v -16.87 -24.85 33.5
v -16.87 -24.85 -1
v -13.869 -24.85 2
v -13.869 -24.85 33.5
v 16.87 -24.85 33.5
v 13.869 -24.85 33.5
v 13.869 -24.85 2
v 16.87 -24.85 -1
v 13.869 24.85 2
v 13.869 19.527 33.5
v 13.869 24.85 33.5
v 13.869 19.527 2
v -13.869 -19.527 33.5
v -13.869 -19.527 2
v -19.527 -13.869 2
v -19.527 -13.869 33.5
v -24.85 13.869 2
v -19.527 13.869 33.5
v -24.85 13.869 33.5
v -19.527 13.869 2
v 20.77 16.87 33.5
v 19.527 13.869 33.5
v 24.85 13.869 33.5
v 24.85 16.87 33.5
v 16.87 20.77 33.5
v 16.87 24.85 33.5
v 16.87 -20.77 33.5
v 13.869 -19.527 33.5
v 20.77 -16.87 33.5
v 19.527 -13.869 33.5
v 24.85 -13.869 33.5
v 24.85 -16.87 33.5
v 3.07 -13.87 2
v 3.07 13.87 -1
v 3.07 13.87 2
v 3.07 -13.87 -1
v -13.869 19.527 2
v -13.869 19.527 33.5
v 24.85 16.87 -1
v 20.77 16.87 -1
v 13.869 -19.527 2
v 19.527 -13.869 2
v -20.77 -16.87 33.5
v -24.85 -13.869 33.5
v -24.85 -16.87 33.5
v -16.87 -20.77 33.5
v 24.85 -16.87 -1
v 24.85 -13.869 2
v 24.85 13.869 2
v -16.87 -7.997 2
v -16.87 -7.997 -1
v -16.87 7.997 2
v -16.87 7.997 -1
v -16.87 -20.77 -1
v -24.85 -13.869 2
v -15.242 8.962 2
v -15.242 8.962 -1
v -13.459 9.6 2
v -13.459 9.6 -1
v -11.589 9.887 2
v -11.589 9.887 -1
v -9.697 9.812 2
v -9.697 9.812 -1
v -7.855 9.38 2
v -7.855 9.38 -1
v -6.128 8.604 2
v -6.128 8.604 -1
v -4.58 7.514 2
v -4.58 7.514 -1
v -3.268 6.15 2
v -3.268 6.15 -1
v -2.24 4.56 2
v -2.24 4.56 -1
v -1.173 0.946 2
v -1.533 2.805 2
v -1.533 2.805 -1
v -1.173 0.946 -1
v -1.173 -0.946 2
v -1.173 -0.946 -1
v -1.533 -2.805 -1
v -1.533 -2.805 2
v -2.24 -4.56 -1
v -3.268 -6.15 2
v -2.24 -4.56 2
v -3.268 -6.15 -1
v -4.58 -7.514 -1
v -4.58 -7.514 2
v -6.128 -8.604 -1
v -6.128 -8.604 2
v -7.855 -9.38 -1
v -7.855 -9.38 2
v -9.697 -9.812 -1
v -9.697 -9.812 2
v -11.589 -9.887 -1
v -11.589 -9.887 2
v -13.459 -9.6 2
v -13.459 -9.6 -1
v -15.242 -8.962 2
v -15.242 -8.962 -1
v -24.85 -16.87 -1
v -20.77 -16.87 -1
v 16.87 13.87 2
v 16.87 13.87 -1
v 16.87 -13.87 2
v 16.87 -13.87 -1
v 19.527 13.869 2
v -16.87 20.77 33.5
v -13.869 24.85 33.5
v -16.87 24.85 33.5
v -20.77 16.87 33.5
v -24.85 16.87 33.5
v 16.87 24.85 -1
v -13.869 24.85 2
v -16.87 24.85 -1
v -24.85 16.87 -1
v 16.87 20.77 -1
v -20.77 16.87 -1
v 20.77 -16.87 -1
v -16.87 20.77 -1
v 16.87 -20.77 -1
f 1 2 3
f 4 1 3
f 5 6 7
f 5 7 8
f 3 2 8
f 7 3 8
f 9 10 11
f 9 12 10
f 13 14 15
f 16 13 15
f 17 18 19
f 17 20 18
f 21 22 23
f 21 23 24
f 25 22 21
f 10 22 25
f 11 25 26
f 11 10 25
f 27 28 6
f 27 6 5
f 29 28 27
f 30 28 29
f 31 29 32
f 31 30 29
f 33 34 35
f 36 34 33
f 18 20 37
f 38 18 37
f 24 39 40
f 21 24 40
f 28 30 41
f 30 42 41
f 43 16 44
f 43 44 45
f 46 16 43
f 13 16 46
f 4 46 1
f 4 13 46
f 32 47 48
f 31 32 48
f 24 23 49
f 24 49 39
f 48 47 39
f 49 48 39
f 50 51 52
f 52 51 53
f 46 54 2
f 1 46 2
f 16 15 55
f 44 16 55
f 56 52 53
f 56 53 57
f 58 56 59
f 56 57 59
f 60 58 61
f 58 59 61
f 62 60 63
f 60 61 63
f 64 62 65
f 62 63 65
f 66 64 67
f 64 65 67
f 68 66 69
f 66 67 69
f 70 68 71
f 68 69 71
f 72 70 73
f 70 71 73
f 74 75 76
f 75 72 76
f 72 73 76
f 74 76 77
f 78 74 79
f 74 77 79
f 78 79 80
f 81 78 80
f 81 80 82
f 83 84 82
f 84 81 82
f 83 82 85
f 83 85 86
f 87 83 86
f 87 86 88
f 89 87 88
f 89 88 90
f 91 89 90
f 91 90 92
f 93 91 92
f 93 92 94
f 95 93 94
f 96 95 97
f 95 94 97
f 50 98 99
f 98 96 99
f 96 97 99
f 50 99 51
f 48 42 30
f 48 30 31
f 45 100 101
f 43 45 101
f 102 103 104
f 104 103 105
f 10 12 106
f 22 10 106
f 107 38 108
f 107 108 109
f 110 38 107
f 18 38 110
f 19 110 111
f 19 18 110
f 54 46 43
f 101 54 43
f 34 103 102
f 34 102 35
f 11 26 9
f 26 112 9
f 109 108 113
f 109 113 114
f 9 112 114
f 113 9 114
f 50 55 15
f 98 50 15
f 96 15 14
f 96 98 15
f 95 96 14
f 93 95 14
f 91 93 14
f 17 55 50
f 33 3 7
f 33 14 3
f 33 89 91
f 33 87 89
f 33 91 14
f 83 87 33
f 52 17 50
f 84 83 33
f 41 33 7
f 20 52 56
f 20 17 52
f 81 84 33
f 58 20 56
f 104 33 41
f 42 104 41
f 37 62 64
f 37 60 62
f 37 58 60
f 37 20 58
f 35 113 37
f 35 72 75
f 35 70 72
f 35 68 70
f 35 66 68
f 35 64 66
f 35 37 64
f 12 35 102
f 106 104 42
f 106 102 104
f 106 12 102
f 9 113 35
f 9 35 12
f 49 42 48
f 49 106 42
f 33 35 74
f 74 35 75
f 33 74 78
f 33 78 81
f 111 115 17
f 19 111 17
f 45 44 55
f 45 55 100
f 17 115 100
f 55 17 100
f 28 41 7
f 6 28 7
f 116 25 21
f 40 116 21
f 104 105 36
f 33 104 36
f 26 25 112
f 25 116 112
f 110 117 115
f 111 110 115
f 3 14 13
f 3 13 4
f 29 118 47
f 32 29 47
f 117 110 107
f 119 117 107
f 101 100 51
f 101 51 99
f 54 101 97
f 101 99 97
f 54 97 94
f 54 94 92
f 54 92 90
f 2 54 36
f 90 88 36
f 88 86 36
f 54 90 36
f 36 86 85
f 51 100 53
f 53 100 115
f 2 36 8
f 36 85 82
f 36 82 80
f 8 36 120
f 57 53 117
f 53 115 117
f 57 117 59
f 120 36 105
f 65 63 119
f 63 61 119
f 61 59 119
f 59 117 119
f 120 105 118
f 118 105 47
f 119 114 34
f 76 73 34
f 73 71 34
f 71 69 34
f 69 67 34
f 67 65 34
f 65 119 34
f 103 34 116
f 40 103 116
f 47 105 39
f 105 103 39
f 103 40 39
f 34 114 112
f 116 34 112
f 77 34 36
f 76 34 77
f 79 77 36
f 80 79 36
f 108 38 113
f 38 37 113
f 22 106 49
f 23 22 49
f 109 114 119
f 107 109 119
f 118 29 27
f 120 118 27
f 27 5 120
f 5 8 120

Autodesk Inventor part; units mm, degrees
ref_plane "YZ Plane" through (0, 0, 0) normal (1, 0, 0) x (0, 1, 0)
ref_plane "XZ Plane" through (0, 0, 0) normal (0, 1, 0) x (-1, 0, 0)
ref_plane "Work Plane1" through (0, 0, -1) normal (0, 0, 1) x (1, 0, 0)
sketch "Sketch1" plane through (0, 0, -1) normal (0, 0, 1) x (1, 0, 0)
  arc A0 (24.85, 22.85) -> (22.85, 24.85) centre (22.85, 22.85) ccw construction
  line L0 (22.85, 24.85) -> (-16.97, 24.85) construction
  line L1 (-16.97, 24.85) -> (-16.97, 21.15) construction
  line L2 (-16.97, 21.15) -> (16.97, 21.15) construction
  line L3 (16.97, 16.97) -> (16.97, 21.15) construction
  line L4 (21.15, 16.97) -> (16.97, 16.97) construction
  line L5 (21.15, 16.97) -> (21.15, -16.97) construction
  line L6 (21.15, -16.97) -> (24.85, -16.97) construction
  line L7 (24.85, -16.97) -> (24.85, 22.85) construction
  line L8 (23.75, 23.25) -> (23.75, 18.15) construction
  arc A1 (23.25, 17.65) -> (23.75, 18.15) centre (23.25, 18.15) ccw construction
  line L9 (23.25, 17.65) -> (20.8937, 17.65) construction
  arc A2 (20.5239, 17.8134) -> (20.8937, 17.65) centre (20.8937, 18.15) ccw construction
  line L10 (20.5239, 17.8134) -> (17.7803, 20.8273) construction
  arc A3 (17.65, 21.1639) -> (17.7803, 20.8273) centre (18.15, 21.1639) ccw construction
  line L11 (17.65, 21.1639) -> (17.65, 23.25) construction
  arc A4 (18.15, 23.75) -> (17.65, 23.25) centre (18.15, 23.25) ccw construction
  line L12 (18.15, 23.75) -> (23.25, 23.75) construction
  arc A5 (23.75, 23.25) -> (23.25, 23.75) centre (23.25, 23.25) ccw construction
  arc A6 (-24.85, -22.85) -> (-22.85, -24.85) centre (-22.85, -22.85) ccw construction
  line L13 (-22.85, -24.85) -> (16.97, -24.85) construction
  line L14 (16.97, -24.85) -> (16.97, -21.15) construction
  line L15 (16.97, -21.15) -> (-16.97, -21.15) construction
  line L16 (-16.97, -16.97) -> (-16.97, -21.15) construction
  line L17 (-21.15, -16.97) -> (-16.97, -16.97) construction
  line L18 (-21.15, -16.97) -> (-21.15, 16.97) construction
  line L19 (-21.15, 16.97) -> (-24.85, 16.97) construction
  line L20 (-24.85, 16.97) -> (-24.85, -22.85) construction
  line L21 (-20.8273, -17.7803) -> (-17.8134, -20.5239) construction
  arc A7 (-17.65, -20.8937) -> (-17.8134, -20.5239) centre (-18.15, -20.8937) ccw construction
  line L22 (-17.65, -20.8937) -> (-17.65, -23.25) construction
  arc A8 (-18.15, -23.75) -> (-17.65, -23.25) centre (-18.15, -23.25) ccw construction
  line L23 (-18.15, -23.75) -> (-23.25, -23.75) construction
  arc A9 (-23.75, -23.25) -> (-23.25, -23.75) centre (-23.25, -23.25) ccw construction
  line L24 (-23.75, -23.25) -> (-23.75, -18.15) construction
  arc A10 (-23.25, -17.65) -> (-23.75, -18.15) centre (-23.25, -18.15) ccw construction
  line L25 (-23.25, -17.65) -> (-21.1639, -17.65) construction
  arc A11 (-20.8273, -17.7803) -> (-21.1639, -17.65) centre (-21.1639, -18.15) ccw construction
  arc A12 (-22.85, 24.85) -> (-24.85, 22.85) centre (-22.85, 22.85) ccw construction
  line L26 (-22.85, 24.85) -> (16.97, 24.85) construction
  line L27 (16.97, 24.85) -> (16.97, 21.15) construction
  line L28 (16.97, 21.15) -> (-16.97, 21.15) construction
  line L29 (-16.97, 16.97) -> (-16.97, 21.15) construction
  line L30 (-21.15, 16.97) -> (-16.97, 16.97) construction
  line L31 (-21.15, 16.97) -> (-21.15, -16.97) construction
  line L32 (-21.15, -16.97) -> (-24.85, -16.97) construction
  line L33 (-24.85, -16.97) -> (-24.85, 22.85) construction
  line L34 (-20.8273, 17.7803) -> (-17.8134, 20.5239) construction
  arc A13 (-17.8134, 20.5239) -> (-17.65, 20.8937) centre (-18.15, 20.8937) ccw construction
  line L35 (-17.65, 20.8937) -> (-17.65, 23.25) construction
  arc A14 (-17.65, 23.25) -> (-18.15, 23.75) centre (-18.15, 23.25) ccw construction
  line L36 (-18.15, 23.75) -> (-23.25, 23.75) construction
  arc A15 (-23.25, 23.75) -> (-23.75, 23.25) centre (-23.25, 23.25) ccw construction
  line L37 (-23.75, 23.25) -> (-23.75, 18.15) construction
  arc A16 (-23.75, 18.15) -> (-23.25, 17.65) centre (-23.25, 18.15) ccw construction
  line L38 (-23.25, 17.65) -> (-21.1639, 17.65) construction
  arc A17 (-21.1639, 17.65) -> (-20.8273, 17.7803) centre (-21.1639, 18.15) ccw construction
  arc A18 (22.85, -24.85) -> (24.85, -22.85) centre (22.85, -22.85) ccw construction
  line L39 (22.85, -24.85) -> (-16.97, -24.85) construction
  line L40 (-16.97, -24.85) -> (-16.97, -21.15) construction
  line L41 (-16.97, -21.15) -> (16.97, -21.15) construction
  line L42 (16.97, -16.97) -> (16.97, -21.15) construction
  line L43 (21.15, -16.97) -> (16.97, -16.97) construction
  line L44 (21.15, -16.97) -> (21.15, 16.97) construction
  line L45 (21.15, 16.97) -> (24.85, 16.97) construction
  line L46 (24.85, 16.97) -> (24.85, -22.85) construction
  line L47 (23.75, -23.25) -> (23.75, -18.15) construction
  arc A19 (23.75, -18.15) -> (23.25, -17.65) centre (23.25, -18.15) ccw construction
  line L48 (23.25, -17.65) -> (20.8937, -17.65) construction
  arc A20 (20.8937, -17.65) -> (20.5239, -17.8134) centre (20.8937, -18.15) ccw construction
  line L49 (20.5239, -17.8134) -> (17.7803, -20.8273) construction
  arc A21 (17.7803, -20.8273) -> (17.65, -21.1639) centre (18.15, -21.1639) ccw construction
  line L50 (17.65, -21.1639) -> (17.65, -23.25) construction
  arc A22 (17.65, -23.25) -> (18.15, -23.75) centre (18.15, -23.25) ccw construction
  line L51 (18.15, -23.75) -> (23.25, -23.75) construction
  arc A23 (23.25, -23.75) -> (23.75, -23.25) centre (23.25, -23.25) ccw construction
  line L52 (24.85, 16.87) -> (16.87, 16.87)
  line L53 (16.87, 16.87) -> (16.87, -16.87)
  line L54 (16.87, -16.87) -> (24.85, -16.87)
  line L55 (24.85, -16.87) -> (24.85, 16.87)
  line L56 (-16.87, 24.85) -> (16.87, 24.85)
  line L57 (16.87, 24.85) -> (16.87, 13.87)
  line L58 (16.87, 13.87) -> (-16.87, 13.87)
  line L59 (-16.87, 13.87) -> (-16.87, 24.85)
  line L60 (-16.87, 16.87) -> (-24.85, 16.87)
  line L61 (-24.85, 16.87) -> (-24.85, -16.87)
  line L62 (-24.85, -16.87) -> (-16.87, -16.87)
  line L63 (-16.87, -16.87) -> (-16.87, 16.87)
  line L64 (-16.87, -24.85) -> (16.87, -24.85)
  line L65 (16.87, -24.85) -> (16.87, -13.87)
  line L66 (16.87, -13.87) -> (-16.87, -13.87)
  line L67 (-16.87, -13.87) -> (-16.87, -24.85)
  arc A24 (12.6573, -5.8482) -> (12.7994, -6.05) centre (12.9383, -5.8013) ccw construction
  line L68 (12.7994, -6.05) -> (16.97, -6.05) construction
  line L69 (16.97, -6.05) -> (16.97, 6.05) construction
  line L70 (12.7994, 6.05) -> (16.97, 6.05) construction
  arc A25 (12.7994, 6.05) -> (12.6573, 5.8482) centre (12.9383, 5.8013) ccw construction
  arc A26 (12.2641, 5.5514) -> (12.6573, 5.8482) centre (11.7553, 6.6343) ccw construction
  arc A27 (12.2641, 5.5514) -> (12.1529, 5.425) centre (12.3846, 5.3332) ccw construction
  line L71 (12.1141, 4.928) -> (12.1529, 5.425) construction
  arc A28 (11.8955, 4.7) -> (12.1141, 4.928) centre (11.8656, 4.9475) ccw construction
  line L72 (11.4444, 4.7) -> (11.8955, 4.7) construction
  arc A29 (11.1961, 4.9275) -> (11.4444, 4.7) centre (11.4444, 4.9493) ccw construction
  line L73 (11.1642, 5.293) -> (11.1961, 4.9275) construction
  arc A30 (11.1642, 5.293) -> (11.0112, 5.5514) centre (10.9164, 5.3208) ccw construction
  arc A31 (10.4933, 5.8954) -> (11.0112, 5.5514) centre (11.4026, 6.7024) ccw construction
  arc A32 (10.4933, 5.8954) -> (10.27, 6.05) centre (10.2627, 5.8008) ccw construction
  line L74 (9.67, 6.05) -> (10.27, 6.05) construction
  line L75 (9.17, 5.55) -> (9.67, 6.05) construction
  line L76 (9.17, 5.55) -> (9.17, -5.55) construction
  line L77 (9.17, -5.55) -> (9.67, -6.05) construction
  line L78 (9.67, -6.05) -> (10.27, -6.05) construction
  arc A33 (10.27, -6.05) -> (10.4933, -5.8954) centre (10.2627, -5.8008) ccw construction
  arc A34 (11.0112, -5.5514) -> (10.4933, -5.8954) centre (11.4026, -6.7024) ccw construction
  arc A35 (11.0112, -5.5514) -> (11.1642, -5.293) centre (10.9164, -5.3208) ccw construction
  line L79 (11.1642, -5.293) -> (11.1961, -4.9275) construction
  arc A36 (11.4444, -4.7) -> (11.1961, -4.9275) centre (11.4444, -4.9493) ccw construction
  line L80 (11.4444, -4.7) -> (11.8955, -4.7) construction
  arc A37 (12.1141, -4.928) -> (11.8955, -4.7) centre (11.8656, -4.9475) ccw construction
  line L81 (12.1141, -4.928) -> (12.1529, -5.425) construction
  arc A38 (12.1529, -5.425) -> (12.2641, -5.5514) centre (12.3846, -5.3332) ccw construction
  arc A39 (12.6573, -5.8482) -> (12.2641, -5.5514) centre (11.7553, -6.6343) ccw construction
  circle A40 centre (-22.53, 11.5) radius 1.025 construction
  circle A41 centre (-22.53, -11.5) radius 1.025 construction
  line L82 (-11.03, -14.1) -> (-11.03, -12.75) construction
  arc A42 (-11.03, 12.75) -> (-11.03, -12.75) centre (-11.03, 0) ccw construction
  line L83 (-11.03, 12.75) -> (-11.03, 14.1) construction
  line L84 (-11.03, 14.1) -> (-22.53, 14.1) construction
  arc A43 (-22.53, 14.1) -> (-25.13, 11.5) centre (-22.53, 11.5) ccw construction
  line L85 (-25.13, 11.5) -> (-25.13, -11.5) construction
  arc A44 (-25.13, -11.5) -> (-22.53, -14.1) centre (-22.53, -11.5) ccw construction
  line L86 (-22.53, -14.1) -> (-11.03, -14.1) construction
  circle A45 centre (-11.03, 0) radius 12.75 construction
  circle A46 centre (0.47, 11.5) radius 1.025 construction
  circle A47 centre (0.47, -11.5) radius 1.025 construction
  circle A48 centre (-22.53, -11.5) radius 1.025 construction
  circle A49 centre (-22.53, 11.5) radius 1.025 construction
  line L87 (-22.53, -14.1) -> (0.47, -14.1) construction
  arc A50 (-25.13, -11.5) -> (-22.53, -14.1) centre (-22.53, -11.5) ccw construction
  line L88 (-25.13, 11.5) -> (-25.13, -11.5) construction
  arc A51 (-22.53, 14.1) -> (-25.13, 11.5) centre (-22.53, 11.5) ccw construction
  line L89 (0.47, 14.1) -> (-22.53, 14.1) construction
  arc A52 (3.07, 11.5) -> (0.47, 14.1) centre (0.47, 11.5) ccw construction
  line L90 (3.07, -11.5) -> (3.07, 11.5) construction
  arc A53 (0.47, -14.1) -> (3.07, -11.5) centre (0.47, -11.5) ccw construction
  line L91 (-16.87, 13.87) -> (3.07, 13.87)
  line L92 (3.07, 13.87) -> (3.07, -13.87)
  line L93 (3.07, -13.87) -> (-16.87, -13.87)
  line L94 (-16.87, -13.87) -> (-16.87, 13.87)
  circle A54 centre (-11.03, 0) radius 2.75 construction
  arc A55 (-16.87, -7.9971) -> (-16.87, 7.9971) centre (-11.03, 0) ccw
  line L95 (-16.87, 7.9971) -> (-16.87, -7.9971)
  point P0 (0, 0)
  dimension "d1" = 0.1
  dimension "d2" = 0.1
  dimension "d3" = 0.1
  dimension "d4" = 0.1
  dimension "d5" = 0.1
  dimension "d6" = 3
  dimension "d7" = 3
extrude "Extrusion1" add sketch "Sketch1" along normal blind 3 contours L55 L54 L53 L52 | L53 L58 L59 L56 L57 | L65 L64 L67 L63 L66 L53 | L92 L66 L63 A55 L58 | L63 L62 L61 L60 L59
chamfer "Chamfer1" distance 3.9 angle 45 4 edges at (16.87, -16.87, 0.5) (-16.87, -16.87, 0.5) (-16.87, 16.87, 0.5) (16.87, 16.87, 0.5)
sketch "Sketch2" plane through (0, 0, 2) normal (0, 0, 1) x (1, 0, 0)
  line L0 (3.07, 13.87) -> (16.87, 13.87) projected
  line L1 (16.87, 13.87) -> (16.87, -13.87) projected
  line L2 (16.87, -13.87) -> (3.07, -13.87) projected
  line L3 (-16.87, -20.77) -> (-16.87, -24.85) projected
  line L4 (-16.87, -24.85) -> (16.87, -24.85) projected
  line L5 (16.87, -24.85) -> (16.87, -20.77) projected
  line L6 (20.77, -16.87) -> (16.87, -20.77) projected
  line L7 (20.77, -16.87) -> (24.85, -16.87) projected
  line L8 (24.85, -16.87) -> (24.85, 16.87) projected
  line L9 (24.85, 16.87) -> (20.77, 16.87) projected
  line L10 (16.87, 20.77) -> (20.77, 16.87) projected
  line L11 (16.87, 20.77) -> (16.87, 24.85) projected
  line L12 (16.87, 24.85) -> (-16.87, 24.85) projected
  line L13 (-16.87, 24.85) -> (-16.87, 20.77) projected
  line L14 (-20.77, 16.87) -> (-16.87, 20.77) projected
  line L15 (-20.77, 16.87) -> (-24.85, 16.87) projected
  line L16 (-24.85, 16.87) -> (-24.85, -16.87) projected
  line L17 (-24.85, -16.87) -> (-20.77, -16.87) projected
  line L18 (-16.87, -20.77) -> (-20.77, -16.87) projected
  line L19 (13.8689, -19.5269) -> (13.8689, -21.8489)
  line L20 (-13.8689, -21.8489) -> (-13.8689, -19.5269)
  line L21 (-13.8689, -19.5269) -> (-19.5269, -13.8689)
  line L22 (-19.5269, -13.8689) -> (-21.8489, -13.8689)
  line L23 (-21.8489, 13.8689) -> (-19.5269, 13.8689)
  line L24 (-19.5269, 13.8689) -> (-13.8689, 19.5269)
  line L25 (-13.8689, 19.5269) -> (-13.8689, 21.8489)
  line L26 (13.8689, 21.8489) -> (13.8689, 19.5269)
  line L27 (13.8689, 19.5269) -> (19.5269, 13.8689)
  line L28 (19.5269, 13.8689) -> (21.8489, 13.8689)
  line L29 (21.8489, -13.8689) -> (19.5269, -13.8689)
  line L30 (19.5269, -13.8689) -> (13.8689, -19.5269)
  line L31 (13.8689, -21.8489) -> (13.8689, -24.85)
  line L32 (16.87, -24.85) -> (-16.87, -24.85) projected
  line L33 (21.8489, -13.8689) -> (24.85, -13.8689)
  line L34 (24.85, -16.87) -> (24.85, 16.87) projected
  line L35 (21.8489, 13.8689) -> (24.85, 13.8689)
  line L36 (13.8689, 21.8489) -> (13.8689, 24.85)
  line L37 (-13.8689, 21.8489) -> (-13.8689, 24.85)
  line L38 (-21.8489, 13.8689) -> (-24.85, 13.8689)
  line L39 (-21.8489, -13.8689) -> (-24.85, -13.8689)
  line L40 (-13.8689, -21.8489) -> (-13.8689, -24.85)
  line L41 (13.8689, -21.8489) -> (11.5469, -21.8489)
  line L42 (-11.5469, -21.8489) -> (-13.8689, -21.8489)
  line L43 (21.8489, 13.8689) -> (21.8489, 11.5469)
  line L44 (21.8489, -11.5469) -> (21.8489, -13.8689)
  line L45 (-21.8489, -13.8689) -> (-21.8489, -11.5469)
  line L46 (-21.8489, 11.5469) -> (-21.8489, 13.8689)
  line L47 (-13.8689, 21.8489) -> (-11.5469, 21.8489)
  line L48 (11.5469, 21.8489) -> (13.8689, 21.8489)
  line L49 (3.07, -13.87) -> (3.07, 13.87) projected
  point P0 (0, 0)
  dimension "d13" = 3.0011
ref_plane "Work Plane2" through (-16.97, -24.85, 34.1) normal (0, 0, -1) x (0, 1, 0)
extrude "Extrusion2" add sketch "Sketch2" along normal blind 31.5 contours L31 L19 L30 L29 L33 L8 L7 L6 L5 L4
pattern_circular "Circular Pattern1" count 4 over 360 about axis through (0, 0, 146.63) along (0, 0, -1) of "Extrusion2"
ref_plane "Work Plane9" through (-16.87, 0, -1) normal (0, 1, 0) x (1, 0, 0)
ref_plane "Work Plane10" through (0, -16.87, -1) normal (-1, 0, 0) x (0, 0, 1)
ref_plane "Work Plane11" through (0, 0, 16.25) normal (0, 0, -1) x (-1, 0, 0)
equation "\"d2\" = d1"
equation "\"d3\" = d1"
equation "\"d4\" = d1"
equation "\"d5\" = d1"
properties part number "20_Cube_Insert_Template_fullcube_v3"
